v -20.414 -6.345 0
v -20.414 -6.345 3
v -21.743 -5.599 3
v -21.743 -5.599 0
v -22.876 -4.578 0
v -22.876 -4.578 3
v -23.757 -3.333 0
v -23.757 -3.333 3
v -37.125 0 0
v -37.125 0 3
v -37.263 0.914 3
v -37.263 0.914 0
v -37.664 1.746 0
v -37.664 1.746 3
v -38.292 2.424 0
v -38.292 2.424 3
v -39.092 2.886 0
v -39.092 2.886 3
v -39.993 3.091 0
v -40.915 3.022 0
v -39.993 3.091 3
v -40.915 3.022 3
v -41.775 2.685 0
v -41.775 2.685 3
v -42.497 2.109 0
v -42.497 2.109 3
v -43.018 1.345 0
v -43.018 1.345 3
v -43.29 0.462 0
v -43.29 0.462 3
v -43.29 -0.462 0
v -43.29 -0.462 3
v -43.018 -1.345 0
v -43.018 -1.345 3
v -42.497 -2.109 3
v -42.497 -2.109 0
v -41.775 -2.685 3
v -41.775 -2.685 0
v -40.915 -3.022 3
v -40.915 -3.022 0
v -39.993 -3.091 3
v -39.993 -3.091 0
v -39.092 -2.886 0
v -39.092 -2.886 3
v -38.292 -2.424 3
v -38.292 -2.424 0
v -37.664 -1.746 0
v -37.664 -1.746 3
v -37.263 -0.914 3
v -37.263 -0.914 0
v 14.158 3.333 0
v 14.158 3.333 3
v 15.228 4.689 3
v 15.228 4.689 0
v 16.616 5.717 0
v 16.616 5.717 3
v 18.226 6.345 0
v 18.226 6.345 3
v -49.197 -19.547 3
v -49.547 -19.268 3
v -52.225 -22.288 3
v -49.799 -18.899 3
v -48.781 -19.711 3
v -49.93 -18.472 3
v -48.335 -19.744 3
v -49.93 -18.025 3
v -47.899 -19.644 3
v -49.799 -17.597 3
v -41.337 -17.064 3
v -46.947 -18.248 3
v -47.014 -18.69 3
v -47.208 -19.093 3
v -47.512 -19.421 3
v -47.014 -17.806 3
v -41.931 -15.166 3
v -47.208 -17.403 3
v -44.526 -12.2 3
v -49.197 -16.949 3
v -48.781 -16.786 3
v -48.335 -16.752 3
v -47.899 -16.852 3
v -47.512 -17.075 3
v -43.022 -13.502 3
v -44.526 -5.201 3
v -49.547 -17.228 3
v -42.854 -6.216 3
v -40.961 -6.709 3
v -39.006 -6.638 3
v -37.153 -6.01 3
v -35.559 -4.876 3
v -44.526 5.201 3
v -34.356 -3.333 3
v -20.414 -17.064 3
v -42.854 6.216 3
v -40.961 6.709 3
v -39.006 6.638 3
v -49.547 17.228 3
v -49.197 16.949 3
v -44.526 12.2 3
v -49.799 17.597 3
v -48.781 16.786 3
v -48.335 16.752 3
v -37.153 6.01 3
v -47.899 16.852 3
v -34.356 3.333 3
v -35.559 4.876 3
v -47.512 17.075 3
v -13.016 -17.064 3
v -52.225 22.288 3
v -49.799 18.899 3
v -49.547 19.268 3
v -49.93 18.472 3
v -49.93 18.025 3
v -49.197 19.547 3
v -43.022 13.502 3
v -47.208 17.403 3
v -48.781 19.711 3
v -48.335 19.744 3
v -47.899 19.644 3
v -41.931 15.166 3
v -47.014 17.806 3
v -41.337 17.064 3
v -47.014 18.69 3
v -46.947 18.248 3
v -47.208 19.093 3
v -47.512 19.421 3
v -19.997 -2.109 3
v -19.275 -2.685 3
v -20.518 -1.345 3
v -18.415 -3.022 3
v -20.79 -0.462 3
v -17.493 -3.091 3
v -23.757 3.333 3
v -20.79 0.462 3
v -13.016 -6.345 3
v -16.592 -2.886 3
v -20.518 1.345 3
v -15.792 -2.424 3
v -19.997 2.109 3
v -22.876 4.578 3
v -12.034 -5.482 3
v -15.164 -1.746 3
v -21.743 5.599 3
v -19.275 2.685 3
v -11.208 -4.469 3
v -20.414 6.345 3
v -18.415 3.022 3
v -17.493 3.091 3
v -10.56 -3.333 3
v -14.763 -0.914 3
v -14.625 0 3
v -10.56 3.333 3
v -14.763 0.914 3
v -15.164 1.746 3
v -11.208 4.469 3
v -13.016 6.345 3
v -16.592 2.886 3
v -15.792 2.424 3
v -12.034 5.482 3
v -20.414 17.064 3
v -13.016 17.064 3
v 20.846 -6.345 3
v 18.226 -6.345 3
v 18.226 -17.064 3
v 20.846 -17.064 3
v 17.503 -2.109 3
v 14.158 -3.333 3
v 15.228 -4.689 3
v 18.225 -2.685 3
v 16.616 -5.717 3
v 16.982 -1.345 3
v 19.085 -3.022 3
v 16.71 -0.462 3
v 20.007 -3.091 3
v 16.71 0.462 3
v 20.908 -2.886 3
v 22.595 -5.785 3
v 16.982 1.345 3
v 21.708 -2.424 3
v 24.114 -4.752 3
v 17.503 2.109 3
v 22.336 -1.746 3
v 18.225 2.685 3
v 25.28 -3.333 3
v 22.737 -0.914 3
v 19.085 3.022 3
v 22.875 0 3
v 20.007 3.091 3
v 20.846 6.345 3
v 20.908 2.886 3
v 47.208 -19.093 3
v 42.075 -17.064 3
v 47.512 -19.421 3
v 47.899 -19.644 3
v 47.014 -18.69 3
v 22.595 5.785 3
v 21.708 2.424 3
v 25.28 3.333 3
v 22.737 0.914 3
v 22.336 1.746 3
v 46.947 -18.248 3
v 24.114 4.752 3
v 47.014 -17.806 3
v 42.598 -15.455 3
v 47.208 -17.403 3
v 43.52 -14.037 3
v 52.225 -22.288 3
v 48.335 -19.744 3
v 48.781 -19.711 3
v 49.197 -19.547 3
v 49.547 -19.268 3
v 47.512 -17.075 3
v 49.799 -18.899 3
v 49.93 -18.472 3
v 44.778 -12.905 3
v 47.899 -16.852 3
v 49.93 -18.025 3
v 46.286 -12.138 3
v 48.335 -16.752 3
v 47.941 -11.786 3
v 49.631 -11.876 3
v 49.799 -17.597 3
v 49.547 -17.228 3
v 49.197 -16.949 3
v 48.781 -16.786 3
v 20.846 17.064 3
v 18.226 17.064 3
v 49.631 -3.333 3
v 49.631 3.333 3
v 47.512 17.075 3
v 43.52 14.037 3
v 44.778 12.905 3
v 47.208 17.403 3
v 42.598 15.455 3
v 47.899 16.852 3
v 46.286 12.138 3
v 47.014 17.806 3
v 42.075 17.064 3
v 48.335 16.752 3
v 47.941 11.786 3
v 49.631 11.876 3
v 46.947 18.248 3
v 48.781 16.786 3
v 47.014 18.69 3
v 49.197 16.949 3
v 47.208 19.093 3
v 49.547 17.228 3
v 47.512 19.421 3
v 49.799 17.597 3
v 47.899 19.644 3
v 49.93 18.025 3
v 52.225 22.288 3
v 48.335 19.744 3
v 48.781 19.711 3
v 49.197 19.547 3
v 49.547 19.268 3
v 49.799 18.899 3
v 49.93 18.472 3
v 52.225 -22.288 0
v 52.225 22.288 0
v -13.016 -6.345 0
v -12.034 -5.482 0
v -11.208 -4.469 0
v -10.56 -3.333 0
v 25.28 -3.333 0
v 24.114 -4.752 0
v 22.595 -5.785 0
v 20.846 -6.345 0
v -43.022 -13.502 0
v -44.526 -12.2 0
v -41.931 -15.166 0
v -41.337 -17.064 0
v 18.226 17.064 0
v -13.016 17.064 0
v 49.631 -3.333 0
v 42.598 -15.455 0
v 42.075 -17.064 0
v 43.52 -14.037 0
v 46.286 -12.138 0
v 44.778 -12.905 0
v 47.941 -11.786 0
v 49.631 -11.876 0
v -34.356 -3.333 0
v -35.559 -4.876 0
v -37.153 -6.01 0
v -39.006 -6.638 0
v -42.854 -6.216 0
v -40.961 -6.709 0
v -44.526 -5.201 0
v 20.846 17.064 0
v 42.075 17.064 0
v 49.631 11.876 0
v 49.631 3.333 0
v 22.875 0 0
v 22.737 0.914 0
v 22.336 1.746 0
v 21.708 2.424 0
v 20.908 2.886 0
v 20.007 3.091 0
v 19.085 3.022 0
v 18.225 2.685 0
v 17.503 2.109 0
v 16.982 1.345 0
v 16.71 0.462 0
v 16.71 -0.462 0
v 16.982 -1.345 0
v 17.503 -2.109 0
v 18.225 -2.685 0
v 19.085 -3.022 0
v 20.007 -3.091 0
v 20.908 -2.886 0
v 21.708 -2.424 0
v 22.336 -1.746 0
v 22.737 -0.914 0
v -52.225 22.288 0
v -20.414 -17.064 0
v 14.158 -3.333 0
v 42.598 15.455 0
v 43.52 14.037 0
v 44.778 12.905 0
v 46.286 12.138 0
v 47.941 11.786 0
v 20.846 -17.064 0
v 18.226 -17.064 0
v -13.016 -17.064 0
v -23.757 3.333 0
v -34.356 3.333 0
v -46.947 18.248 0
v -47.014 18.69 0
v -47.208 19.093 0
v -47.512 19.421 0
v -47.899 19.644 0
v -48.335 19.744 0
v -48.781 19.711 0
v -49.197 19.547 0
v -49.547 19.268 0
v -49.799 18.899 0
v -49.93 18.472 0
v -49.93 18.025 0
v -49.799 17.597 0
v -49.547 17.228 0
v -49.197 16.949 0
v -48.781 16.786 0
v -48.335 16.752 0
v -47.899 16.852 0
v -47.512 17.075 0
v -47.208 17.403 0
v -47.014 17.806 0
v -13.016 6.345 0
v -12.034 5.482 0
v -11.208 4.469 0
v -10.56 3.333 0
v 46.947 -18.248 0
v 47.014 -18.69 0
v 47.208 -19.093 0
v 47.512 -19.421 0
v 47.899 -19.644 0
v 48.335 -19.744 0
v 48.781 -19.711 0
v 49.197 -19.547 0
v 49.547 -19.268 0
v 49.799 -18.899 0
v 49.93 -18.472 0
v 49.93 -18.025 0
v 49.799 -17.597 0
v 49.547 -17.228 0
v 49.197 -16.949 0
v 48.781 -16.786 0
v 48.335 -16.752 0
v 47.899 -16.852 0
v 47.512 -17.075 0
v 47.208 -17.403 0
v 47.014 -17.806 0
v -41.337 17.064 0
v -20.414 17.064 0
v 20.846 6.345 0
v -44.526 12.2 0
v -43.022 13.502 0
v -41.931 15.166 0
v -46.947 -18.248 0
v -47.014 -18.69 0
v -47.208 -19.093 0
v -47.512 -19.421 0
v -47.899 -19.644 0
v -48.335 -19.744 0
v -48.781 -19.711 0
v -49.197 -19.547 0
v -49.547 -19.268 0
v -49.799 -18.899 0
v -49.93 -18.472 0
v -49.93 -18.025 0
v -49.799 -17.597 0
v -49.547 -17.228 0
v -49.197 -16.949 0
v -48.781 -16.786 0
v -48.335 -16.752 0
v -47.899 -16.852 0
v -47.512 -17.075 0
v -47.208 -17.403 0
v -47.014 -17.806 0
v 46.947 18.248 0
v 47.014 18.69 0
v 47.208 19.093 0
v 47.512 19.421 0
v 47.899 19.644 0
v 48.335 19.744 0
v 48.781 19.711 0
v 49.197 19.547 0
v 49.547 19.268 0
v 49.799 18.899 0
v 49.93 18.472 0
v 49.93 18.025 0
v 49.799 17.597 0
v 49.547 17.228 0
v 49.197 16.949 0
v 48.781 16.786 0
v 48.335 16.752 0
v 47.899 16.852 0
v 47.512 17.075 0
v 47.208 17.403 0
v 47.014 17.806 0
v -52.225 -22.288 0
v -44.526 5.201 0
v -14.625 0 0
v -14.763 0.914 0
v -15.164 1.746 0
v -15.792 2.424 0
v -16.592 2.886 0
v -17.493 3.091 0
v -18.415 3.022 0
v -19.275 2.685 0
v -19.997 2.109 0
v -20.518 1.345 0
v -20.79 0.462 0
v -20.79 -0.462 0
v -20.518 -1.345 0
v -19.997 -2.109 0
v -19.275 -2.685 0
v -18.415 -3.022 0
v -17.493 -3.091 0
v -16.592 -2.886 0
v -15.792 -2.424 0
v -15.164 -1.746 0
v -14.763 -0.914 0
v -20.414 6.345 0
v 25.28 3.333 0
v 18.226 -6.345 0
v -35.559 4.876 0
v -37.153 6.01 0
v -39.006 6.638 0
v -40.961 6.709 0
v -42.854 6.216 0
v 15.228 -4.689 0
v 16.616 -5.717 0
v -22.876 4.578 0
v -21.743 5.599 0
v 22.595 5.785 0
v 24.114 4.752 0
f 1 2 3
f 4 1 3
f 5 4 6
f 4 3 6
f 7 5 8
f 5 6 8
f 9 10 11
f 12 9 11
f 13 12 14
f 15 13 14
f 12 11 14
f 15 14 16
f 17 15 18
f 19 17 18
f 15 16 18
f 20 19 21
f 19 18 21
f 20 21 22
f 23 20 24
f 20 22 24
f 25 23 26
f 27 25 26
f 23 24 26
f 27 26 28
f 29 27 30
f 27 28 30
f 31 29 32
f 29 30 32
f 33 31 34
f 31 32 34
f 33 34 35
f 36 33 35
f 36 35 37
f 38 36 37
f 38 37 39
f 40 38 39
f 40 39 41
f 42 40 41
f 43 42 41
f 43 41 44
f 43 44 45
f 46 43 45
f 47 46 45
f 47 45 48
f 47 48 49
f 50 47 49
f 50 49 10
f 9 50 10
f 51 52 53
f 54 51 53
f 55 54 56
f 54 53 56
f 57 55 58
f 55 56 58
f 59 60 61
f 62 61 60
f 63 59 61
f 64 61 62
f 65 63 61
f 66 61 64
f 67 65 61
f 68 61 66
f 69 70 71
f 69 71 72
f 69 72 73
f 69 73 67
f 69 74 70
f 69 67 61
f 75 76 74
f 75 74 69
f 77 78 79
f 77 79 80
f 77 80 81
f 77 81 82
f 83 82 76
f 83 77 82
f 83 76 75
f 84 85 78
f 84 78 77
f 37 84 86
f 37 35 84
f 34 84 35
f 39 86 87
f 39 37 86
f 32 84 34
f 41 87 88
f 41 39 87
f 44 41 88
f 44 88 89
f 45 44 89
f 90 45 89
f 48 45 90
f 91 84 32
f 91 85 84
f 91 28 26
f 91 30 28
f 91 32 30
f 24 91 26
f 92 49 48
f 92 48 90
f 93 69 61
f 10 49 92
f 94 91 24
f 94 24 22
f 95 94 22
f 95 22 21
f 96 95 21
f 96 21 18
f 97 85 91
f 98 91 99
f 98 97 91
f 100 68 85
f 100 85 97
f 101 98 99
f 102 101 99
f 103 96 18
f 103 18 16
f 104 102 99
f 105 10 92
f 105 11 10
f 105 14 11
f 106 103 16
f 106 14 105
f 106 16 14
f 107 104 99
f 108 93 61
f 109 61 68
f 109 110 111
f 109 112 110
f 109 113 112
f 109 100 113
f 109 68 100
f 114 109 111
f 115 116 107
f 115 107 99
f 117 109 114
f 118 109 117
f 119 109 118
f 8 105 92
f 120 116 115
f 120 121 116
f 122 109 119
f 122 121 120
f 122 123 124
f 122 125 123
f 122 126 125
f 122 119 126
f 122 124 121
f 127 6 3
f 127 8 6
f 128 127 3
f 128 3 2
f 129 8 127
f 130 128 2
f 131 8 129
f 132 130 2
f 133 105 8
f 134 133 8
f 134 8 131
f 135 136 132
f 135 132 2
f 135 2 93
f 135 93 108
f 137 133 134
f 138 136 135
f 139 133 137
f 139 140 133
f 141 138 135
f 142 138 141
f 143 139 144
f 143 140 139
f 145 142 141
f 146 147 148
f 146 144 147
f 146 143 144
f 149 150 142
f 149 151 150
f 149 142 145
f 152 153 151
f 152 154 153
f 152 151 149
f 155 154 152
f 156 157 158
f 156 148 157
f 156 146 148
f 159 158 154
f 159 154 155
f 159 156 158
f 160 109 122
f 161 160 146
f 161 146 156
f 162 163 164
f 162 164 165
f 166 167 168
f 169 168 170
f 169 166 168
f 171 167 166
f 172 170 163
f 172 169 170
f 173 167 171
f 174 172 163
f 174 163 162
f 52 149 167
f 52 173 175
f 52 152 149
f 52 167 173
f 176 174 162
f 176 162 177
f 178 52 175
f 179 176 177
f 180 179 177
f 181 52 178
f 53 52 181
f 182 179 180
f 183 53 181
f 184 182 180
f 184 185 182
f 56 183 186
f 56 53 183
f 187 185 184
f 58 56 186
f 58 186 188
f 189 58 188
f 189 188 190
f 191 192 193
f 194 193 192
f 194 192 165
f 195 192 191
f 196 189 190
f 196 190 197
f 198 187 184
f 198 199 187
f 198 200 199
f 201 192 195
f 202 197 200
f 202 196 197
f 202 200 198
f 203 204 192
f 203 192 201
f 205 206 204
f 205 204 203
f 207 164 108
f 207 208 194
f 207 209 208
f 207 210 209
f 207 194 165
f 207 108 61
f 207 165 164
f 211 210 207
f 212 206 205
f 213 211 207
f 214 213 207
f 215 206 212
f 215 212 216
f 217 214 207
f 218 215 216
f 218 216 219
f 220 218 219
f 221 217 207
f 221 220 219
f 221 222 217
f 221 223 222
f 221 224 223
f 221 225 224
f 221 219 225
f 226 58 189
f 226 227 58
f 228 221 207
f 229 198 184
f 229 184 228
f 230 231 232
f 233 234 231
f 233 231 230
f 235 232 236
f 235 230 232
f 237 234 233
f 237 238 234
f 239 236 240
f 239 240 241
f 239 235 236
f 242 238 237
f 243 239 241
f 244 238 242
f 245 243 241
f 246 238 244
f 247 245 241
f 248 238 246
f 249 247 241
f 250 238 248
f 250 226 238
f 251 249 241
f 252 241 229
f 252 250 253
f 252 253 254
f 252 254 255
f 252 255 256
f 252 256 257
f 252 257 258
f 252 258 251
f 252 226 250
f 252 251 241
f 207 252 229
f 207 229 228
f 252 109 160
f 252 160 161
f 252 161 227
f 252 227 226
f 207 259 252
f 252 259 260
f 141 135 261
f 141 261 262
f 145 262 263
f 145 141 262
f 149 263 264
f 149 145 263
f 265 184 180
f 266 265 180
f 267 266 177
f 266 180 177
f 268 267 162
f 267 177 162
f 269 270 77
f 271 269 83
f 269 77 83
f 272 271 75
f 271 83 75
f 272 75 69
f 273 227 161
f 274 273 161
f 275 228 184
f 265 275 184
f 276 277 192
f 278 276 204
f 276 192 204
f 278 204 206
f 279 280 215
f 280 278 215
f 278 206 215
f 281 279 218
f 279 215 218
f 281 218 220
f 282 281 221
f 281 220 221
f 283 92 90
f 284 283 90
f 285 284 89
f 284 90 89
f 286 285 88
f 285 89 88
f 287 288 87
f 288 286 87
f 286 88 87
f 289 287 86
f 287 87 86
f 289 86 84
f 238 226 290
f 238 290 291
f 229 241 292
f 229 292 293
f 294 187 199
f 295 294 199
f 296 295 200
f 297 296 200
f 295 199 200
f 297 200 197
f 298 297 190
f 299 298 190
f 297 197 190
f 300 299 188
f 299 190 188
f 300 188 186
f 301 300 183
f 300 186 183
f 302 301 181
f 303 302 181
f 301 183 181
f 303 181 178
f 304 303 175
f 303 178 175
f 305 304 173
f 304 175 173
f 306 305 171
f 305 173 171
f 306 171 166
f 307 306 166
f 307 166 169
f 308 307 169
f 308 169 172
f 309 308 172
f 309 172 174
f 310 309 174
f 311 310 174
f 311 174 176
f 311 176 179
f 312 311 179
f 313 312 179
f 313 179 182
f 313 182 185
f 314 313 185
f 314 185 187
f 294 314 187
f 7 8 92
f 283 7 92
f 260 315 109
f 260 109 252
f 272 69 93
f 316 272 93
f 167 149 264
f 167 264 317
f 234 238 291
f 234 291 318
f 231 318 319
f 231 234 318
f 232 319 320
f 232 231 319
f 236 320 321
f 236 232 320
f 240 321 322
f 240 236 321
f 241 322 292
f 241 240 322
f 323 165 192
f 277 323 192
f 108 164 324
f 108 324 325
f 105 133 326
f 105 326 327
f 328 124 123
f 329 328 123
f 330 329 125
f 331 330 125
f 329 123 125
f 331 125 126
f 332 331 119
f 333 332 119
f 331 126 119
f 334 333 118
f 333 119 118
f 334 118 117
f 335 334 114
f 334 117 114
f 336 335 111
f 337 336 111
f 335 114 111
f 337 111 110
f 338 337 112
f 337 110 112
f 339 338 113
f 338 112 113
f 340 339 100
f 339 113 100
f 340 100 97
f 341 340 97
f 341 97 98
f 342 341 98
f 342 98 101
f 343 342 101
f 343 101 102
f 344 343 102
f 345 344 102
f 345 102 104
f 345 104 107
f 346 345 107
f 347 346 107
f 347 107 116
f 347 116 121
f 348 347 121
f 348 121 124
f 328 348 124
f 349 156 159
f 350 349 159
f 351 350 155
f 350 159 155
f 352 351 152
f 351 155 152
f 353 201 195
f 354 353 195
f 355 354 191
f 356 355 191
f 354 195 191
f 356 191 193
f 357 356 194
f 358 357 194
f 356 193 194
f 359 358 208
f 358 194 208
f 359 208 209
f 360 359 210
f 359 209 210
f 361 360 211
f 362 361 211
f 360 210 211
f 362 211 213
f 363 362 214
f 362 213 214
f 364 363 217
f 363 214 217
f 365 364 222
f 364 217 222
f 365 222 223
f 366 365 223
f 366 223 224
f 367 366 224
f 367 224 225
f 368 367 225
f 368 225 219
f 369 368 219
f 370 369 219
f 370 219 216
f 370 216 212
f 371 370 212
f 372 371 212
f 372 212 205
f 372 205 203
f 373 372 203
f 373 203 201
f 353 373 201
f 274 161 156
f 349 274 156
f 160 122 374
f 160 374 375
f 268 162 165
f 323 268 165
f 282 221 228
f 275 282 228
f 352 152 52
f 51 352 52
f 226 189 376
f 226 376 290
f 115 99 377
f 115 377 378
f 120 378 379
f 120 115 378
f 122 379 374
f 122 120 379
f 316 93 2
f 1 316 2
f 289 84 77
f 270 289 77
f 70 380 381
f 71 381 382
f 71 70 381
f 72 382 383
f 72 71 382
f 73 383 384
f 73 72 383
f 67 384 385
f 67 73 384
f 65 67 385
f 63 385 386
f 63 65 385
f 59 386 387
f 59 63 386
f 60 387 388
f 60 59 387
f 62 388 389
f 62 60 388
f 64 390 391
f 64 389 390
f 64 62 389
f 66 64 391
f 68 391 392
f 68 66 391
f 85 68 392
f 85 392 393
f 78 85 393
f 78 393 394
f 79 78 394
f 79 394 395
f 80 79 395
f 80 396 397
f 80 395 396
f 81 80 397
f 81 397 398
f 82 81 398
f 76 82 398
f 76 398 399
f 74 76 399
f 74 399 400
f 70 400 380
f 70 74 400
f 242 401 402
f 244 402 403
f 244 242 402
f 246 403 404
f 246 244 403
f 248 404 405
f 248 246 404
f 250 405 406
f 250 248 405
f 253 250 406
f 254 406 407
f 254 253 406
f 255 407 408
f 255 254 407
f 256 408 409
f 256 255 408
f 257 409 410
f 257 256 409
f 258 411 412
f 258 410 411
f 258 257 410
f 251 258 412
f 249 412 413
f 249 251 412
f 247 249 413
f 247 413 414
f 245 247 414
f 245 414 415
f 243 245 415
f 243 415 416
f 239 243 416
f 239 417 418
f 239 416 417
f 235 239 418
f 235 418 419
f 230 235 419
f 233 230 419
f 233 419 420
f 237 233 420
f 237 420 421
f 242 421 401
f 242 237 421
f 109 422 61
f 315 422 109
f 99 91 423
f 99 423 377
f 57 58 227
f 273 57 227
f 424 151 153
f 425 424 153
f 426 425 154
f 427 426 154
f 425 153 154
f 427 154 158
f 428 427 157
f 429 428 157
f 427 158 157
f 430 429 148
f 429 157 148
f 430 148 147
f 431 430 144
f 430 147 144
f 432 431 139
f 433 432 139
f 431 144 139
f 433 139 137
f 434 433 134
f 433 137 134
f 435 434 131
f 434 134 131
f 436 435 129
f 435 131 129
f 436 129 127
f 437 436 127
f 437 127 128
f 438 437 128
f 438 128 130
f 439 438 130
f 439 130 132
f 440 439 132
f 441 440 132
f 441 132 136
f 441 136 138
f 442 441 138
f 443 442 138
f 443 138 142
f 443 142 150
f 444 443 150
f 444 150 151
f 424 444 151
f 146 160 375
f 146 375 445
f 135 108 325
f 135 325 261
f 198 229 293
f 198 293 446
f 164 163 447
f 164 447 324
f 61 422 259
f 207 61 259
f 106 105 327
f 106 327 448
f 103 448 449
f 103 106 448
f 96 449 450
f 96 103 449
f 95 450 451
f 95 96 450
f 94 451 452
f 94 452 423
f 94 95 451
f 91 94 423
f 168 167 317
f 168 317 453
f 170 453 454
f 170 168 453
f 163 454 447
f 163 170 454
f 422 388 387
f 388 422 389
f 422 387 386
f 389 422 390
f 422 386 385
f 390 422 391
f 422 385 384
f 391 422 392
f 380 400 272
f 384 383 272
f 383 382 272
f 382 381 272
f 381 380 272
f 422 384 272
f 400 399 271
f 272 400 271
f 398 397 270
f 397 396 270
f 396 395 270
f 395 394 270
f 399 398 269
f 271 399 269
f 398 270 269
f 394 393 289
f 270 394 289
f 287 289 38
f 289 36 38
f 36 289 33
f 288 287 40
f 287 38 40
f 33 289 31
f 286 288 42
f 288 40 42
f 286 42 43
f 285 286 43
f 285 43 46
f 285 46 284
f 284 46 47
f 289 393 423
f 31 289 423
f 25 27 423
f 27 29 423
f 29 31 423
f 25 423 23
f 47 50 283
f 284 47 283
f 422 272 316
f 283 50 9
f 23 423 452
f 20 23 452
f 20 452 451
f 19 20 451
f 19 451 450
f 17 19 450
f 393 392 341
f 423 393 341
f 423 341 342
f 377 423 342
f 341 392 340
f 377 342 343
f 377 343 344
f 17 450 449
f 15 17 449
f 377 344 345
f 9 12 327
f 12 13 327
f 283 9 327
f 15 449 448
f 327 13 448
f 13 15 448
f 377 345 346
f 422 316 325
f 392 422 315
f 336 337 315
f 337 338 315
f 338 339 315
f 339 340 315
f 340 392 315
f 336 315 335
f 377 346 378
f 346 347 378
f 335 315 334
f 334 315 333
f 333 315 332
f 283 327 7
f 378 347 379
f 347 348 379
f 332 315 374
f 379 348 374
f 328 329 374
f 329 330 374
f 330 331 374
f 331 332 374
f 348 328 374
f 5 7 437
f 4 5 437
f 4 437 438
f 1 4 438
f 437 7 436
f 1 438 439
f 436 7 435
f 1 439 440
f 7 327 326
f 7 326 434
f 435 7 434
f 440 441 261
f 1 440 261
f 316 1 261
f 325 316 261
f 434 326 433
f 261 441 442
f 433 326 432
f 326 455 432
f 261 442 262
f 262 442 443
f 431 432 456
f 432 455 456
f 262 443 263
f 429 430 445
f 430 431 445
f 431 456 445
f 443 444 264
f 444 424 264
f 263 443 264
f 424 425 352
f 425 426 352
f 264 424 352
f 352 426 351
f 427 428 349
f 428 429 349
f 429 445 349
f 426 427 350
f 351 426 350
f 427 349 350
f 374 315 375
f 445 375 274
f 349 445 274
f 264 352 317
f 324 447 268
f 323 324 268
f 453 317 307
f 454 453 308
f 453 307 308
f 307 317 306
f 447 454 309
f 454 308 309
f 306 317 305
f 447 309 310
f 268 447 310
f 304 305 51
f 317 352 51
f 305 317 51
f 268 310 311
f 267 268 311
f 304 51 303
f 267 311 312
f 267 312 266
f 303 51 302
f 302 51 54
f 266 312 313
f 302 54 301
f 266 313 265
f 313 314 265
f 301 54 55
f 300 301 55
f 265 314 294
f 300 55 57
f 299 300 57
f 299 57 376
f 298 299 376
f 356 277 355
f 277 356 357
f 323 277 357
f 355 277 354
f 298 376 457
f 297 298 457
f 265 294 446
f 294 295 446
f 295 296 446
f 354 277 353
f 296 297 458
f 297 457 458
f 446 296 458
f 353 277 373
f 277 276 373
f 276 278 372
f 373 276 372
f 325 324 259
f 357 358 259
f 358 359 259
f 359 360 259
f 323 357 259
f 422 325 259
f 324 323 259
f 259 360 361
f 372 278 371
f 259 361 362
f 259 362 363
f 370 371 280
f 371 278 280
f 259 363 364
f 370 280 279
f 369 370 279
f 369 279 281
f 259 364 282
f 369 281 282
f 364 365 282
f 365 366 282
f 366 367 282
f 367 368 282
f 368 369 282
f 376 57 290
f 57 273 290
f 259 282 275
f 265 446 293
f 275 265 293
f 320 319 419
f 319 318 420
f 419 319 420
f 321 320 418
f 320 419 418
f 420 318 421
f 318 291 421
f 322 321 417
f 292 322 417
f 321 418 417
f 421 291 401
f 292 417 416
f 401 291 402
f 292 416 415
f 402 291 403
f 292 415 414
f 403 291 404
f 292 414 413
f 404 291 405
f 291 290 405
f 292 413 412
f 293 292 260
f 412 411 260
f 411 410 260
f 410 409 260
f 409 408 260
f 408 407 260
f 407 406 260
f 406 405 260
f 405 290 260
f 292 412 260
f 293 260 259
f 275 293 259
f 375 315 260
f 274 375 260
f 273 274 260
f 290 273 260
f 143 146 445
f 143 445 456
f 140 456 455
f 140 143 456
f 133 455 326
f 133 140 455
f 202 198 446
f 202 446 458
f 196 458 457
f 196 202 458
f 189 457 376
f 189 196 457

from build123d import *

# Parameters (mm, degrees)
SKETCH1_W               = 104.449895642
SKETCH1_H               = 44.57694291
BOSS_EXTRUDE1_DEPTH     = 3
SKETCH3_R               = 3.1
CUT_EXTRUDE1_DEPTH      = 10
SKETCH4_R               = 1.5
CUT_EXTRUDE2_DEPTH      = 10
MIRROR2_COPY_1_SKETCH_R = 1.5
MIRROR2_COPY_1_DEPTH    = 10
CUT_EXTRUDE3_DEPTH      = 57.861420442
CUT_EXTRUDE4_DEPTH      = 57.861420442
CUT_EXTRUDE5_DEPTH      = 57.861420442


with BuildPart() as part:
    # Sketch1 → Boss-Extrude1 (new body)
    with BuildSketch(Plane.XY):
        Rectangle(SKETCH1_W, SKETCH1_H)
    extrude(amount=BOSS_EXTRUDE1_DEPTH)

    # Sketch3 → Cut-Extrude1 (cut)
    with BuildSketch(Plane.XY.offset(3)):
        with Locations((19.775052179, 0)):
            Circle(SKETCH3_R)
        with Locations((-17.724947821, 0)):
            Circle(SKETCH3_R)
        with Locations((-40.224947821, 0)):
            Circle(SKETCH3_R)
    extrude(amount=-CUT_EXTRUDE1_DEPTH, mode=Mode.SUBTRACT)

    # Sketch4 → Cut-Extrude2 (cut)
    with BuildSketch(Plane.XY.offset(3)):
        with Locations((-48.447057672, 18.248177723)):
            Circle(SKETCH4_R)
    cut_extrude2 = extrude(amount=-CUT_EXTRUDE2_DEPTH, mode=Mode.SUBTRACT)

    # Mirror1: Cut-Extrude2 across plane
    add(cut_extrude2.mirror(Plane(origin=(0, 0, 0), x_dir=(0, 0, 1), z_dir=(1, 0, 0))), mode=Mode.SUBTRACT)

    # Mirror2: Cut-Extrude2 across plane
    add(cut_extrude2.mirror(Plane.ZX), mode=Mode.SUBTRACT)

    # Mirror2 copy 1 sketch → Mirror2 copy 1 (cut)
    with BuildSketch(Plane(origin=(0, 0, 3), x_dir=(-1, 0, 0), z_dir=(0, 0, 1))):
        with Locations((-48.447057672, 18.248177723)):
            Circle(MIRROR2_COPY_1_SKETCH_R)
    extrude(amount=-MIRROR2_COPY_1_DEPTH, mode=Mode.SUBTRACT)

    # Sketch5 → Cut-Extrude3 (cut, through all)
    with BuildSketch(Plane.XY.offset(3)):
        with BuildLine():
            Line((-41.337055779, 17.064455462), (-20.413840907, 17.064455462))
            Line((-20.413840907, 17.064455462), (-20.413840907, 6.345404524))
            ThreePointArc((-20.413840907, 6.345404524), (-22.338128988, 5.11985001), (-23.756861687, 3.333214622))
            Line((-23.756861687, 3.333214622), (-34.356294023, 3.333214622))
            ThreePointArc((-34.356294023, 3.333214622), (-39.005765332, 6.638148173), (-44.52617342, 5.201045612))
            Line((-44.52617342, 5.201045612), (-44.52617342, 12.200038175))
            ThreePointArc((-44.52617342, 12.200038175), (-42.419143342, 14.296270065), (-41.337055779, 17.064455462))
        make_face()
    cut_extrude3 = extrude(amount=-CUT_EXTRUDE3_DEPTH, mode=Mode.SUBTRACT)

    # Mirror3: Cut-Extrude3 across plane
    add(cut_extrude3.mirror(Plane.ZX), mode=Mode.SUBTRACT)

    # Sketch6 → Cut-Extrude4 (cut, through all)
    with BuildSketch(Plane.XY.offset(3)):
        with BuildLine():
            Line((-13.015804561, -17.064455462), (-13.015804561, -6.345404524))
            ThreePointArc((-13.015804561, -6.345404524), (-11.600072812, -4.992604025), (-10.56046116, -3.333214622))
            Line((-10.56046116, -3.333214622), (14.157752022, -3.333214622))
            ThreePointArc((14.157752022, -3.333214622), (15.888120713, -5.249394684), (18.225787128, -6.345404524))
            Line((18.225787128, -6.345404524), (18.225787128, -17.064455462))
            Line((18.225787128, -17.064455462), (-13.015804561, -17.064455462))
        make_face()
    cut_extrude4 = extrude(amount=-CUT_EXTRUDE4_DEPTH, mode=Mode.SUBTRACT)

    # Mirror4: Cut-Extrude4 across plane
    add(cut_extrude4.mirror(Plane.ZX), mode=Mode.SUBTRACT)

    # Sketch7 → Cut-Extrude5 (cut, through all)
    with BuildSketch(Plane.XY.offset(3)):
        with BuildLine():
            Line((20.845739993, -6.345404524), (20.845739993, -17.064455462))
            Line((20.845739993, -17.064455462), (42.074566495, -17.064455462))
            ThreePointArc((42.074566495, -17.064455462), (44.778043986, -12.905127961), (49.630779933, -11.875686546))
            Line((49.630779933, -11.875686546), (49.630779933, -3.333214622))
            Line((49.630779933, -3.333214622), (25.279614946, -3.333214622))
            ThreePointArc((25.279614946, -3.333214622), (23.391238299, -5.322943633), (20.845739993, -6.345404524))
        make_face()
    cut_extrude5 = extrude(amount=-CUT_EXTRUDE5_DEPTH, mode=Mode.SUBTRACT)

    # Mirror5: Cut-Extrude5 across plane
    add(cut_extrude5.mirror(Plane.ZX), mode=Mode.SUBTRACT)


solid = part.part
